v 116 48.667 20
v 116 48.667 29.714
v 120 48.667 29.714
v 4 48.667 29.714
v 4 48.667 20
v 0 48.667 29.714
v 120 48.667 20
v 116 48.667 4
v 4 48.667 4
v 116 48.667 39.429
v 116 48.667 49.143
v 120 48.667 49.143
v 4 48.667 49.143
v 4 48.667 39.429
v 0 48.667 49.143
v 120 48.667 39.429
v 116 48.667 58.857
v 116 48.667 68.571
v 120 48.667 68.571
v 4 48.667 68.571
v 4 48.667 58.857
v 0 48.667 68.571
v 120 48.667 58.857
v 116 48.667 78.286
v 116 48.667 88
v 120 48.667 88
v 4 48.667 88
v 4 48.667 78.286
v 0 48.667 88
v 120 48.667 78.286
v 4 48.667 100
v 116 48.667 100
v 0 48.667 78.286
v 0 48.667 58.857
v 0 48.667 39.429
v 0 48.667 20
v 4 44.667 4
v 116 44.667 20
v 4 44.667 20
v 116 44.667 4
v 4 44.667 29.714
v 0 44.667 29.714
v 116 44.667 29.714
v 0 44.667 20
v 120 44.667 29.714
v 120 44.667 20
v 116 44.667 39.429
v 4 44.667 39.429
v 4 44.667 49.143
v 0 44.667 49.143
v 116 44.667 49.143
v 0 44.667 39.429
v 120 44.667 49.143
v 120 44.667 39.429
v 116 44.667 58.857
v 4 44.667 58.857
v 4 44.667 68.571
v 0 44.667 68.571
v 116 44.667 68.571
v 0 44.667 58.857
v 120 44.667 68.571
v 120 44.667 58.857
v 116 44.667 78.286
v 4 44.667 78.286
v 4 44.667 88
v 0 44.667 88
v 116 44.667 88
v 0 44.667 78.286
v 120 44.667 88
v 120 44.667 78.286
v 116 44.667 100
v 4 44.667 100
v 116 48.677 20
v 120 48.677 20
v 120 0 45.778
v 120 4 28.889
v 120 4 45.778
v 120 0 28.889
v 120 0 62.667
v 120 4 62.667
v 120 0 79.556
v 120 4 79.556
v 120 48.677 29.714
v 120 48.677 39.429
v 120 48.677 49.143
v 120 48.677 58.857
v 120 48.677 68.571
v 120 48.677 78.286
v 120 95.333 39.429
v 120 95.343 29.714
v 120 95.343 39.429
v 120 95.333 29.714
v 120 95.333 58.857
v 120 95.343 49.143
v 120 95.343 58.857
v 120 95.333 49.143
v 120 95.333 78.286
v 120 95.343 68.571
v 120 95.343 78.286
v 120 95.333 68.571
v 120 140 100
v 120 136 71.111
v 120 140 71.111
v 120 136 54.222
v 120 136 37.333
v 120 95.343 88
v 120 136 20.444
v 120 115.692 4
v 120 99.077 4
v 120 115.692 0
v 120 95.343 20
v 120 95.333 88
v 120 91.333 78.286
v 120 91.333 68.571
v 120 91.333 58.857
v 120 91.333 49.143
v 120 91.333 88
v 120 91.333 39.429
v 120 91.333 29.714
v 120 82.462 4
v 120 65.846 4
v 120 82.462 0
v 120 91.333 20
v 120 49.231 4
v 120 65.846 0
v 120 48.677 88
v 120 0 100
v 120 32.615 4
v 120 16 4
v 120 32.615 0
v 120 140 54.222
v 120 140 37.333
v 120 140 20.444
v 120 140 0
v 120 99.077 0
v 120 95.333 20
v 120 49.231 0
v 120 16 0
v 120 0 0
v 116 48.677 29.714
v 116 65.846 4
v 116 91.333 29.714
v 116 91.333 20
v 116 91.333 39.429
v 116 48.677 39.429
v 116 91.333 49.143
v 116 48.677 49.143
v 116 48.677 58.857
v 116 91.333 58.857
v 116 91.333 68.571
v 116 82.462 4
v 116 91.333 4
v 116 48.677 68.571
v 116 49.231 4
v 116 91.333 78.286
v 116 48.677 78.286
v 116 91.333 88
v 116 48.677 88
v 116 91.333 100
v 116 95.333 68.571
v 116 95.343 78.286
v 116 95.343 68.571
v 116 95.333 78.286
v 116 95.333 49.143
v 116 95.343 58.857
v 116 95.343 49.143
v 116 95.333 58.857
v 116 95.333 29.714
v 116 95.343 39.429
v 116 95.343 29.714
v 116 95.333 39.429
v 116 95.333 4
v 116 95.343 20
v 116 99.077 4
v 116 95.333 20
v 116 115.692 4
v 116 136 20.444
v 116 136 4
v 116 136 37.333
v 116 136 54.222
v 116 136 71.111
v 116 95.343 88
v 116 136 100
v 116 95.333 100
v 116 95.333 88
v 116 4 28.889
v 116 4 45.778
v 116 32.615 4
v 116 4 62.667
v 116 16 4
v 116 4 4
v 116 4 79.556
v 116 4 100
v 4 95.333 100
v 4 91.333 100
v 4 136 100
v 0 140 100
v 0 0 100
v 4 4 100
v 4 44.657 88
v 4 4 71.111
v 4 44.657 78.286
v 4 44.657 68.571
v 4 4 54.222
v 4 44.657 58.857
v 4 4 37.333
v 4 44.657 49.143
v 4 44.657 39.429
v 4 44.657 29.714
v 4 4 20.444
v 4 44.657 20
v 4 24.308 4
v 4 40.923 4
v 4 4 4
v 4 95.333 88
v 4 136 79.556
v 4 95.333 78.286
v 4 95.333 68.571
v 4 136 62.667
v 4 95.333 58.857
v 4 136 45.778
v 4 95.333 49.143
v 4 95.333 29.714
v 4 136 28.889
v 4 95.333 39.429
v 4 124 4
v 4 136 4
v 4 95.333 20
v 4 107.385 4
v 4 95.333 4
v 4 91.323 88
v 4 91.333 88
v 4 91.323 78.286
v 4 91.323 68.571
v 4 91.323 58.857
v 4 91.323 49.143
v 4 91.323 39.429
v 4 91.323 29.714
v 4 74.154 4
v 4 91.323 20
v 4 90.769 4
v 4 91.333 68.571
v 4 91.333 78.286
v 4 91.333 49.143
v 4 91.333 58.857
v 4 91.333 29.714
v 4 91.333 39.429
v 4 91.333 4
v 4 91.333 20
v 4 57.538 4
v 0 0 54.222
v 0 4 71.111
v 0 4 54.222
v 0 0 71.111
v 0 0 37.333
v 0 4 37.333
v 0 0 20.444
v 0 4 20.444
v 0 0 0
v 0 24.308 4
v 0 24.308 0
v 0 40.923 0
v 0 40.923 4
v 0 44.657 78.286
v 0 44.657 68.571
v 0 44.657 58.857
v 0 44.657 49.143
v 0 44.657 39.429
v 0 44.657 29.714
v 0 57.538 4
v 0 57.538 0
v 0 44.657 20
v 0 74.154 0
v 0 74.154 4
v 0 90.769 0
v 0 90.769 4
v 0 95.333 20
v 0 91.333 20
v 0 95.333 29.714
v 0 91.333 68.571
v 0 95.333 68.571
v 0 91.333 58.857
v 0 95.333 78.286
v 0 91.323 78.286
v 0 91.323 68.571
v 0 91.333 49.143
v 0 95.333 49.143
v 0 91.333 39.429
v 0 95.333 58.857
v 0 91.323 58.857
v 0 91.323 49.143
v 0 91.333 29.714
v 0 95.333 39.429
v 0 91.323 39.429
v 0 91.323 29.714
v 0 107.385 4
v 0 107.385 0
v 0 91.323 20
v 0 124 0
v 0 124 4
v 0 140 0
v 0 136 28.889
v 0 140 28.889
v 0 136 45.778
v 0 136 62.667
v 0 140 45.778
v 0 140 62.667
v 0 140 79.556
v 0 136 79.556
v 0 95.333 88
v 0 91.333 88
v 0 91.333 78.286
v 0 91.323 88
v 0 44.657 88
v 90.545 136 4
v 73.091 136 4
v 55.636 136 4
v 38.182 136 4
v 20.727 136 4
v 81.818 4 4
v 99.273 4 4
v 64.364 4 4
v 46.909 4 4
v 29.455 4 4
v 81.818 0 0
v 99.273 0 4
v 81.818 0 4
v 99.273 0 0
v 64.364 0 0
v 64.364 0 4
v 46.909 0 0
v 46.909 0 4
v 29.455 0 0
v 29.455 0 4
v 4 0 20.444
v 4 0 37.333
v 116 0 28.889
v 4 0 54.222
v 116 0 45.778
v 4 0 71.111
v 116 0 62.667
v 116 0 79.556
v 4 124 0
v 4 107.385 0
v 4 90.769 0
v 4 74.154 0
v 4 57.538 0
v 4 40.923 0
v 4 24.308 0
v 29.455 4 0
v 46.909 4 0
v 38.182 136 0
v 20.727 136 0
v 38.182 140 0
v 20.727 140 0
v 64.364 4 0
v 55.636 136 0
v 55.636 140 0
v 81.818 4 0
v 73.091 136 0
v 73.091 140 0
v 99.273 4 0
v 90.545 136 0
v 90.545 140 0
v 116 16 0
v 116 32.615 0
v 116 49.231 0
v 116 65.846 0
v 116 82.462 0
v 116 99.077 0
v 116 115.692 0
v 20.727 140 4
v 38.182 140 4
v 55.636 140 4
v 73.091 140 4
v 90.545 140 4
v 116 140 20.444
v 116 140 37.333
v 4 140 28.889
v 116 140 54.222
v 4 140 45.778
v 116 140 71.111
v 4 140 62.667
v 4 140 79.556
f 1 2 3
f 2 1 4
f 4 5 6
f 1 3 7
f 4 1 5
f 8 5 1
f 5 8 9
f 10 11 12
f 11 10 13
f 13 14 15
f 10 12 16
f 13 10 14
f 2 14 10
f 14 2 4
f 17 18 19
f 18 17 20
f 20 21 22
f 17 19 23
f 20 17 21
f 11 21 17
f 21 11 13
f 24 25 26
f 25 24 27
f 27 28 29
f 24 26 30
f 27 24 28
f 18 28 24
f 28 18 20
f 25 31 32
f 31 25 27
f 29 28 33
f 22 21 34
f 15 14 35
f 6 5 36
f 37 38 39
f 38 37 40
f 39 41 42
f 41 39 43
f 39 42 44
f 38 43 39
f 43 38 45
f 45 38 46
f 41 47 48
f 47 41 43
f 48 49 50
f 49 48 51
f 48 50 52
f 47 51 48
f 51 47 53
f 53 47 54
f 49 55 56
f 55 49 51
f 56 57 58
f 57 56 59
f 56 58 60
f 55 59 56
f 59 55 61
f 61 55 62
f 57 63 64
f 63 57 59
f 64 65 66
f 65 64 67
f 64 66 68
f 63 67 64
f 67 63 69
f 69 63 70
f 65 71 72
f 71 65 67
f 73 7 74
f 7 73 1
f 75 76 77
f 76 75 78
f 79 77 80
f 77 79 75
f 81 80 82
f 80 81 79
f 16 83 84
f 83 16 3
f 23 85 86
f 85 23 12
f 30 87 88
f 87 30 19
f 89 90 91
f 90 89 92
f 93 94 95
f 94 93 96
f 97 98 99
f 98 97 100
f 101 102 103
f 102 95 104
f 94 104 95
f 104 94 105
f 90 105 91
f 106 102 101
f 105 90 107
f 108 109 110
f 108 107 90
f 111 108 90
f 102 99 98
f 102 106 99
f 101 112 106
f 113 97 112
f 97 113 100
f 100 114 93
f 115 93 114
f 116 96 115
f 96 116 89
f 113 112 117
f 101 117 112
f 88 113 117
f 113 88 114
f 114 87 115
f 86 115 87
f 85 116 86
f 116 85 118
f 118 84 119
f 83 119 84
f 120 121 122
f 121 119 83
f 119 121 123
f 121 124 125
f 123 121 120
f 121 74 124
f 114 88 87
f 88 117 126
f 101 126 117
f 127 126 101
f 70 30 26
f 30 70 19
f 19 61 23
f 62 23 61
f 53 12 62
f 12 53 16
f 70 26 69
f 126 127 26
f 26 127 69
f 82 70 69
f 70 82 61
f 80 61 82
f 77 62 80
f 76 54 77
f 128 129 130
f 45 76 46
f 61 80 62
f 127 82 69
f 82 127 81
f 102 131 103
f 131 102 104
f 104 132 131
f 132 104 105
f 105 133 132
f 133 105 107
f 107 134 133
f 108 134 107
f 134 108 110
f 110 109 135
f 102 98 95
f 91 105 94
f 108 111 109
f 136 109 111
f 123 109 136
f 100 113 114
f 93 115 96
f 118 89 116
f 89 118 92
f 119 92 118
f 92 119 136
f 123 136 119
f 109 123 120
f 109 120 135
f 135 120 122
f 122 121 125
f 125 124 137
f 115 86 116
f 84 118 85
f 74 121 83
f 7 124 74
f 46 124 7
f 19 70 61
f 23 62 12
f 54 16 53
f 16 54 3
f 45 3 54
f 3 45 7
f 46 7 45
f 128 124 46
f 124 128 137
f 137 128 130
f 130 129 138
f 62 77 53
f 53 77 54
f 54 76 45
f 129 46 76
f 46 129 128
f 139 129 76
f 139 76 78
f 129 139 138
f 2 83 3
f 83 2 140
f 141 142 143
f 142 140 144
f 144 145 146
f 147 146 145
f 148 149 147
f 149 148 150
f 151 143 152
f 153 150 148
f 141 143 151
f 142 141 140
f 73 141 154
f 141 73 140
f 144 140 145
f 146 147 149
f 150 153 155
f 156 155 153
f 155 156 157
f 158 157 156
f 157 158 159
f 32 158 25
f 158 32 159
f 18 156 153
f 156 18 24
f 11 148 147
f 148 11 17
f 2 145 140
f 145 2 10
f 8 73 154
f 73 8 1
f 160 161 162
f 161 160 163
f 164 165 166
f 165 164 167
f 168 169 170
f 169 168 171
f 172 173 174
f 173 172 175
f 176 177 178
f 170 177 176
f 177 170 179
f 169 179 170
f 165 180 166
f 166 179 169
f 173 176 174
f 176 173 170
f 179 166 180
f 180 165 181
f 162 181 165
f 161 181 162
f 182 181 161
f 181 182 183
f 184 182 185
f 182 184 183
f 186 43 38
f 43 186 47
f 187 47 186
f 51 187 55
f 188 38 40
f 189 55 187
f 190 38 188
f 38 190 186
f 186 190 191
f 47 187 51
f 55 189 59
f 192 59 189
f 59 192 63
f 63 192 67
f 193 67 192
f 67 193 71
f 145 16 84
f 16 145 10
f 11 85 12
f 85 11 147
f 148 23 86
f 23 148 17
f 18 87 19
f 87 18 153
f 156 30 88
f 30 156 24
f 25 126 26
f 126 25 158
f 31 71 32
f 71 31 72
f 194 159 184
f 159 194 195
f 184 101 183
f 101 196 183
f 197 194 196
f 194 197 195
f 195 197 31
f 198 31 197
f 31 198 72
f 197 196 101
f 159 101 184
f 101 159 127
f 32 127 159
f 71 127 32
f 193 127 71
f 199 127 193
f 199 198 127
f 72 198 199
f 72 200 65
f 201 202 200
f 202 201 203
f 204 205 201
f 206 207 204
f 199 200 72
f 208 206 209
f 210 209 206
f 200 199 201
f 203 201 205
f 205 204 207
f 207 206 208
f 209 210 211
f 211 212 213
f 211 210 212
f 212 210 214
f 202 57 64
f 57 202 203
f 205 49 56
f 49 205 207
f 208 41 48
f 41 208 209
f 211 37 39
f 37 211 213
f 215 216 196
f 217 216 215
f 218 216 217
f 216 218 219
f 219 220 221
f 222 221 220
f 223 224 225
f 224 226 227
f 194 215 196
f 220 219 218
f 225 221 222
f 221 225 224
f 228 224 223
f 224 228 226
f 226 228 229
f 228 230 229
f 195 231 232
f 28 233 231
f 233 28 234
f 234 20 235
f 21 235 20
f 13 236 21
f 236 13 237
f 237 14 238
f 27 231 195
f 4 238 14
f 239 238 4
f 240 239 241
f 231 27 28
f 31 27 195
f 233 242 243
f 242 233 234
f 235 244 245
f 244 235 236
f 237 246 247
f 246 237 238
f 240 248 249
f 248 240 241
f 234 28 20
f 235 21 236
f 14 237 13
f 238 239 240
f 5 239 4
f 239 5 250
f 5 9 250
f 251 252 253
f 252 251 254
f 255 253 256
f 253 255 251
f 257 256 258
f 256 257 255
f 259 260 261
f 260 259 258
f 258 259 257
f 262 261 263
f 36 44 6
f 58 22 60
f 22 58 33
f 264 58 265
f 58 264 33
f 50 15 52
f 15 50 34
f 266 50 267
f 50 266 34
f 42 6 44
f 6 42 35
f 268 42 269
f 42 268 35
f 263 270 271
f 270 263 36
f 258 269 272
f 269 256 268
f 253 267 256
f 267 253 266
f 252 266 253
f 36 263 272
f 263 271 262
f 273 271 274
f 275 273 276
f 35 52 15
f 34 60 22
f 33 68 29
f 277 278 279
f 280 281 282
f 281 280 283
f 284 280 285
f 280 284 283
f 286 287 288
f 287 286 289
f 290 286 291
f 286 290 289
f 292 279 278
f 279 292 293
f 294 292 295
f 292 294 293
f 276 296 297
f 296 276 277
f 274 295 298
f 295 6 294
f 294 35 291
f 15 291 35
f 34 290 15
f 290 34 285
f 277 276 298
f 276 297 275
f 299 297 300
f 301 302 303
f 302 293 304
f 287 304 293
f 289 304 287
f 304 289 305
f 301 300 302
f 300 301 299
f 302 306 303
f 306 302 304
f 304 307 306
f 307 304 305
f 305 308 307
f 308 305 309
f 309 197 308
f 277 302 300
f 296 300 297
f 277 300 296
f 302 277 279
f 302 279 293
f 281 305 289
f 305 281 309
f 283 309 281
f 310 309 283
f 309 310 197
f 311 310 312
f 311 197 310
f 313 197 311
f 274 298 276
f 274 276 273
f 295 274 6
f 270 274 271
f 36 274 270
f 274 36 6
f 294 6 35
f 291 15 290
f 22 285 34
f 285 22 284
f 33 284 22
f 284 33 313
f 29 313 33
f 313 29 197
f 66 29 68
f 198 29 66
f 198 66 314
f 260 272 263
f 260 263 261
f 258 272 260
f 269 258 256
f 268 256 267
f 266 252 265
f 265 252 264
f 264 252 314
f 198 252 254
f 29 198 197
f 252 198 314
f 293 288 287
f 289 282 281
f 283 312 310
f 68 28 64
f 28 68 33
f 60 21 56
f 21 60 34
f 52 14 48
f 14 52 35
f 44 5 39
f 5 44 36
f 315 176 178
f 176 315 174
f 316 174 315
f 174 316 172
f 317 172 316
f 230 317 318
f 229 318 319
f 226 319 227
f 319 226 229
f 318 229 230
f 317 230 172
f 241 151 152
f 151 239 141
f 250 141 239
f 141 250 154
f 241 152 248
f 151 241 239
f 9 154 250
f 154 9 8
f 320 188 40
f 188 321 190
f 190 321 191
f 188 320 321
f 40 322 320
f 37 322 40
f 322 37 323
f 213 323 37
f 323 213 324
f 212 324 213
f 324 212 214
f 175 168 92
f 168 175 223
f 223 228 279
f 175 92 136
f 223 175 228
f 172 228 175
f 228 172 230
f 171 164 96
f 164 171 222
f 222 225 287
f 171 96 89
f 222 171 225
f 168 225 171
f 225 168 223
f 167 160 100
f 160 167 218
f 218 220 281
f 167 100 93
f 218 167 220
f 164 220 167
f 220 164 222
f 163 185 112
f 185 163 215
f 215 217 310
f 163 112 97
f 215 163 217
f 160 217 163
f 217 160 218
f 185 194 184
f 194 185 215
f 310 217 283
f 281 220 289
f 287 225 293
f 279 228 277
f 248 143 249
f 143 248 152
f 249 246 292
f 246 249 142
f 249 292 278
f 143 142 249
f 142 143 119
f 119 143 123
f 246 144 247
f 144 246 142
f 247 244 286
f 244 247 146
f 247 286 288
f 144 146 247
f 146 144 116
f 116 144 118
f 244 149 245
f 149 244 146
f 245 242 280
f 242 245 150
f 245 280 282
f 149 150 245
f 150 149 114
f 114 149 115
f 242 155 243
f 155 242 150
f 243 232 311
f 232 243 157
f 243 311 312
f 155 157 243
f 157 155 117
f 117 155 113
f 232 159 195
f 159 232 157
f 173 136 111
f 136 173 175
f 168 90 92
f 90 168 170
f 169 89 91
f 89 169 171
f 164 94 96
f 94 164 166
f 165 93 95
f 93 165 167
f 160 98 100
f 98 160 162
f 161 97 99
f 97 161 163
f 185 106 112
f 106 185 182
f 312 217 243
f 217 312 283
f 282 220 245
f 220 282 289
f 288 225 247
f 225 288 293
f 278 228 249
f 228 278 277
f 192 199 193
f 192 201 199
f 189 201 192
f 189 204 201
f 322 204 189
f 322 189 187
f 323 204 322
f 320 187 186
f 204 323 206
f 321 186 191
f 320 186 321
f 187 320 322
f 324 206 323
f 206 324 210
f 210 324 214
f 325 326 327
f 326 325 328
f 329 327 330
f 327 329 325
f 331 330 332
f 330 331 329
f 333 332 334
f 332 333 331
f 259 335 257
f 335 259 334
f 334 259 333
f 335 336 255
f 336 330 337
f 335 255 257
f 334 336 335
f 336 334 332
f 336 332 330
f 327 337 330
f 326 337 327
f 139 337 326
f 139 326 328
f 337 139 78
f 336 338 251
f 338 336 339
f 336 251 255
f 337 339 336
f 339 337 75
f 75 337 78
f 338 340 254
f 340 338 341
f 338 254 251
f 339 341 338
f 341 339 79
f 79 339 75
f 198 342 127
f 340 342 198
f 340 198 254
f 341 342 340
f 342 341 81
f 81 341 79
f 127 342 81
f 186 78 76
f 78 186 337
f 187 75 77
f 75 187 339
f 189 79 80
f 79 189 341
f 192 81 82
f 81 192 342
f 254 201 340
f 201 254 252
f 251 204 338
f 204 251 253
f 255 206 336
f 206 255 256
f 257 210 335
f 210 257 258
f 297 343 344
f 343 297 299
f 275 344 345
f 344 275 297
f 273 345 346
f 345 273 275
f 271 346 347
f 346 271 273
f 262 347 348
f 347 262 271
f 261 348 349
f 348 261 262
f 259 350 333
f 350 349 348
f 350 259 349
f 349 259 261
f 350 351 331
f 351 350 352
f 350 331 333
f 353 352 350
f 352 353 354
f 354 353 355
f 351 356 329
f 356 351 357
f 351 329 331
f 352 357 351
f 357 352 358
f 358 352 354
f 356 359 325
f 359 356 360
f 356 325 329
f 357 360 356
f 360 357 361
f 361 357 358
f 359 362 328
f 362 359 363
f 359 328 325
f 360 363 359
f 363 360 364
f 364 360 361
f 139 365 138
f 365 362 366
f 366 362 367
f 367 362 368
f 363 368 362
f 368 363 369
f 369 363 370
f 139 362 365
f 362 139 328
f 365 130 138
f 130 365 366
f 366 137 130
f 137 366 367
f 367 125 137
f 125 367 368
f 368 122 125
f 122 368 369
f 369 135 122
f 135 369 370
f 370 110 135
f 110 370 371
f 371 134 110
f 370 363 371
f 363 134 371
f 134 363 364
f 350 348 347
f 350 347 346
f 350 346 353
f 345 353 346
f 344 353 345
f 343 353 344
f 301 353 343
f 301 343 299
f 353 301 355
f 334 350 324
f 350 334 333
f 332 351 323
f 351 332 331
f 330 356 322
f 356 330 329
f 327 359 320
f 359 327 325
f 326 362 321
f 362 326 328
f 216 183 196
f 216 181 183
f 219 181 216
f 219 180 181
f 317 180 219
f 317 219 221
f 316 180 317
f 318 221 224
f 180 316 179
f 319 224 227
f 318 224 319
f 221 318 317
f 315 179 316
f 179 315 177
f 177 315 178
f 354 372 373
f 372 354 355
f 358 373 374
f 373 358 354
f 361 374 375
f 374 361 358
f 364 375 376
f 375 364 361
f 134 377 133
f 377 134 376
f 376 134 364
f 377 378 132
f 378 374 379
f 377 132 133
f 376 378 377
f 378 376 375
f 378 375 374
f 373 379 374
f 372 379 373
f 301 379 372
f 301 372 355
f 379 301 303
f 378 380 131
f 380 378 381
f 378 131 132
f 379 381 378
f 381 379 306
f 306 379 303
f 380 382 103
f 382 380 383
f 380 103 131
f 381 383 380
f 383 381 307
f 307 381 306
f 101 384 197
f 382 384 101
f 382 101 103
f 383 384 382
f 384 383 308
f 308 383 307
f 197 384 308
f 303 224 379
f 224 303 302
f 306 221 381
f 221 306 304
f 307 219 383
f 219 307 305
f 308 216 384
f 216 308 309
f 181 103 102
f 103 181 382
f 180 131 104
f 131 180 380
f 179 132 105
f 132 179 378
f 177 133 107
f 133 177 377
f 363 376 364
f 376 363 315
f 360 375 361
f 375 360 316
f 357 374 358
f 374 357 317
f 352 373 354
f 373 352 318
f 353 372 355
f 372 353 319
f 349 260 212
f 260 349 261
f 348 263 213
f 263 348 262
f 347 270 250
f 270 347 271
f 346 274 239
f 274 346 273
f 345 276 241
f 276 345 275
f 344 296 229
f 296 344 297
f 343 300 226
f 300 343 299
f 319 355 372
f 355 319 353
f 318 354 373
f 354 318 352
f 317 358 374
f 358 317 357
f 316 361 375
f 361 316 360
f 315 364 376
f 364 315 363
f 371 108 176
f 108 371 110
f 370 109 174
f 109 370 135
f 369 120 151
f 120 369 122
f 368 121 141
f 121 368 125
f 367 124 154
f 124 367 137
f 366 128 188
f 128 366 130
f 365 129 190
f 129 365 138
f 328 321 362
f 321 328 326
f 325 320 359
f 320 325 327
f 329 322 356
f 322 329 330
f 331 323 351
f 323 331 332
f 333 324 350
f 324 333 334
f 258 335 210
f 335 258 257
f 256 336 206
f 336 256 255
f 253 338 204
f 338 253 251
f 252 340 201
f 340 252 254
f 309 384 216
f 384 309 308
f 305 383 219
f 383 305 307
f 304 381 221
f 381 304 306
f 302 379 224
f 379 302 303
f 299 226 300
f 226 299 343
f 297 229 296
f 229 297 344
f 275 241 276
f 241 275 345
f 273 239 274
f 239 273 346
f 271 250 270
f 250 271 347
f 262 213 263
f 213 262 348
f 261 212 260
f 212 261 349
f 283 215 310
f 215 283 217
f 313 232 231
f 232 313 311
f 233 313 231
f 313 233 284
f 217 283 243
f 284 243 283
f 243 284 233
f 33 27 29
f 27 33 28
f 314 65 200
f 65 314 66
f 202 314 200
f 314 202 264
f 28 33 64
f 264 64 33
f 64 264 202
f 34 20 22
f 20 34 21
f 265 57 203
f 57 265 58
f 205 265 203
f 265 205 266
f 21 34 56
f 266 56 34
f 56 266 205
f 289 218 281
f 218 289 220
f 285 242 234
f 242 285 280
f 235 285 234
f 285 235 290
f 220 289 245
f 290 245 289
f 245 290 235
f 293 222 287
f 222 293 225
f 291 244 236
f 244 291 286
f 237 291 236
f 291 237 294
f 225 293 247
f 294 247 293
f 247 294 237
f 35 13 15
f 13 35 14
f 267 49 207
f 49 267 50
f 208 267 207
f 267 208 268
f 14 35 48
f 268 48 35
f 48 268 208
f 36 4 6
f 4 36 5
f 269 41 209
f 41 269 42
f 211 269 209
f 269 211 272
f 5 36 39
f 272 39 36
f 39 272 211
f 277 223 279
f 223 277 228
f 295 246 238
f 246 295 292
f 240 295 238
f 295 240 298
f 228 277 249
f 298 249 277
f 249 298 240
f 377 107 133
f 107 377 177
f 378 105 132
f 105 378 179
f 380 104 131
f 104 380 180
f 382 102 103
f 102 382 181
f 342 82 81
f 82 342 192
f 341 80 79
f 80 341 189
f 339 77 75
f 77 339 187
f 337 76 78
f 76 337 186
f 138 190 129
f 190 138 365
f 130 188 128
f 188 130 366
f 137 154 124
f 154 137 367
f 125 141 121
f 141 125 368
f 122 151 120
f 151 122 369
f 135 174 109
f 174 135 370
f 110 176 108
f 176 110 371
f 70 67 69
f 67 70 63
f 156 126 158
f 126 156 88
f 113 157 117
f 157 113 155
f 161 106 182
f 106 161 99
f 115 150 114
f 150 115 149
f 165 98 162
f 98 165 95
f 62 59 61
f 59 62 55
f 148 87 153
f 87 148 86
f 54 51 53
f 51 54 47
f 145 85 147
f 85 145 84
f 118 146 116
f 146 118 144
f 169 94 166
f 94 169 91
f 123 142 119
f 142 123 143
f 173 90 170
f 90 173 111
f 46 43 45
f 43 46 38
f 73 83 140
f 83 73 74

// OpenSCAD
include <../box.scad>
box(width = 120, height = 100, depth = 140, dividers = [ 2, 0 ], thickness = 4, open = true, assemble = true, labels = true, explode = 0);
